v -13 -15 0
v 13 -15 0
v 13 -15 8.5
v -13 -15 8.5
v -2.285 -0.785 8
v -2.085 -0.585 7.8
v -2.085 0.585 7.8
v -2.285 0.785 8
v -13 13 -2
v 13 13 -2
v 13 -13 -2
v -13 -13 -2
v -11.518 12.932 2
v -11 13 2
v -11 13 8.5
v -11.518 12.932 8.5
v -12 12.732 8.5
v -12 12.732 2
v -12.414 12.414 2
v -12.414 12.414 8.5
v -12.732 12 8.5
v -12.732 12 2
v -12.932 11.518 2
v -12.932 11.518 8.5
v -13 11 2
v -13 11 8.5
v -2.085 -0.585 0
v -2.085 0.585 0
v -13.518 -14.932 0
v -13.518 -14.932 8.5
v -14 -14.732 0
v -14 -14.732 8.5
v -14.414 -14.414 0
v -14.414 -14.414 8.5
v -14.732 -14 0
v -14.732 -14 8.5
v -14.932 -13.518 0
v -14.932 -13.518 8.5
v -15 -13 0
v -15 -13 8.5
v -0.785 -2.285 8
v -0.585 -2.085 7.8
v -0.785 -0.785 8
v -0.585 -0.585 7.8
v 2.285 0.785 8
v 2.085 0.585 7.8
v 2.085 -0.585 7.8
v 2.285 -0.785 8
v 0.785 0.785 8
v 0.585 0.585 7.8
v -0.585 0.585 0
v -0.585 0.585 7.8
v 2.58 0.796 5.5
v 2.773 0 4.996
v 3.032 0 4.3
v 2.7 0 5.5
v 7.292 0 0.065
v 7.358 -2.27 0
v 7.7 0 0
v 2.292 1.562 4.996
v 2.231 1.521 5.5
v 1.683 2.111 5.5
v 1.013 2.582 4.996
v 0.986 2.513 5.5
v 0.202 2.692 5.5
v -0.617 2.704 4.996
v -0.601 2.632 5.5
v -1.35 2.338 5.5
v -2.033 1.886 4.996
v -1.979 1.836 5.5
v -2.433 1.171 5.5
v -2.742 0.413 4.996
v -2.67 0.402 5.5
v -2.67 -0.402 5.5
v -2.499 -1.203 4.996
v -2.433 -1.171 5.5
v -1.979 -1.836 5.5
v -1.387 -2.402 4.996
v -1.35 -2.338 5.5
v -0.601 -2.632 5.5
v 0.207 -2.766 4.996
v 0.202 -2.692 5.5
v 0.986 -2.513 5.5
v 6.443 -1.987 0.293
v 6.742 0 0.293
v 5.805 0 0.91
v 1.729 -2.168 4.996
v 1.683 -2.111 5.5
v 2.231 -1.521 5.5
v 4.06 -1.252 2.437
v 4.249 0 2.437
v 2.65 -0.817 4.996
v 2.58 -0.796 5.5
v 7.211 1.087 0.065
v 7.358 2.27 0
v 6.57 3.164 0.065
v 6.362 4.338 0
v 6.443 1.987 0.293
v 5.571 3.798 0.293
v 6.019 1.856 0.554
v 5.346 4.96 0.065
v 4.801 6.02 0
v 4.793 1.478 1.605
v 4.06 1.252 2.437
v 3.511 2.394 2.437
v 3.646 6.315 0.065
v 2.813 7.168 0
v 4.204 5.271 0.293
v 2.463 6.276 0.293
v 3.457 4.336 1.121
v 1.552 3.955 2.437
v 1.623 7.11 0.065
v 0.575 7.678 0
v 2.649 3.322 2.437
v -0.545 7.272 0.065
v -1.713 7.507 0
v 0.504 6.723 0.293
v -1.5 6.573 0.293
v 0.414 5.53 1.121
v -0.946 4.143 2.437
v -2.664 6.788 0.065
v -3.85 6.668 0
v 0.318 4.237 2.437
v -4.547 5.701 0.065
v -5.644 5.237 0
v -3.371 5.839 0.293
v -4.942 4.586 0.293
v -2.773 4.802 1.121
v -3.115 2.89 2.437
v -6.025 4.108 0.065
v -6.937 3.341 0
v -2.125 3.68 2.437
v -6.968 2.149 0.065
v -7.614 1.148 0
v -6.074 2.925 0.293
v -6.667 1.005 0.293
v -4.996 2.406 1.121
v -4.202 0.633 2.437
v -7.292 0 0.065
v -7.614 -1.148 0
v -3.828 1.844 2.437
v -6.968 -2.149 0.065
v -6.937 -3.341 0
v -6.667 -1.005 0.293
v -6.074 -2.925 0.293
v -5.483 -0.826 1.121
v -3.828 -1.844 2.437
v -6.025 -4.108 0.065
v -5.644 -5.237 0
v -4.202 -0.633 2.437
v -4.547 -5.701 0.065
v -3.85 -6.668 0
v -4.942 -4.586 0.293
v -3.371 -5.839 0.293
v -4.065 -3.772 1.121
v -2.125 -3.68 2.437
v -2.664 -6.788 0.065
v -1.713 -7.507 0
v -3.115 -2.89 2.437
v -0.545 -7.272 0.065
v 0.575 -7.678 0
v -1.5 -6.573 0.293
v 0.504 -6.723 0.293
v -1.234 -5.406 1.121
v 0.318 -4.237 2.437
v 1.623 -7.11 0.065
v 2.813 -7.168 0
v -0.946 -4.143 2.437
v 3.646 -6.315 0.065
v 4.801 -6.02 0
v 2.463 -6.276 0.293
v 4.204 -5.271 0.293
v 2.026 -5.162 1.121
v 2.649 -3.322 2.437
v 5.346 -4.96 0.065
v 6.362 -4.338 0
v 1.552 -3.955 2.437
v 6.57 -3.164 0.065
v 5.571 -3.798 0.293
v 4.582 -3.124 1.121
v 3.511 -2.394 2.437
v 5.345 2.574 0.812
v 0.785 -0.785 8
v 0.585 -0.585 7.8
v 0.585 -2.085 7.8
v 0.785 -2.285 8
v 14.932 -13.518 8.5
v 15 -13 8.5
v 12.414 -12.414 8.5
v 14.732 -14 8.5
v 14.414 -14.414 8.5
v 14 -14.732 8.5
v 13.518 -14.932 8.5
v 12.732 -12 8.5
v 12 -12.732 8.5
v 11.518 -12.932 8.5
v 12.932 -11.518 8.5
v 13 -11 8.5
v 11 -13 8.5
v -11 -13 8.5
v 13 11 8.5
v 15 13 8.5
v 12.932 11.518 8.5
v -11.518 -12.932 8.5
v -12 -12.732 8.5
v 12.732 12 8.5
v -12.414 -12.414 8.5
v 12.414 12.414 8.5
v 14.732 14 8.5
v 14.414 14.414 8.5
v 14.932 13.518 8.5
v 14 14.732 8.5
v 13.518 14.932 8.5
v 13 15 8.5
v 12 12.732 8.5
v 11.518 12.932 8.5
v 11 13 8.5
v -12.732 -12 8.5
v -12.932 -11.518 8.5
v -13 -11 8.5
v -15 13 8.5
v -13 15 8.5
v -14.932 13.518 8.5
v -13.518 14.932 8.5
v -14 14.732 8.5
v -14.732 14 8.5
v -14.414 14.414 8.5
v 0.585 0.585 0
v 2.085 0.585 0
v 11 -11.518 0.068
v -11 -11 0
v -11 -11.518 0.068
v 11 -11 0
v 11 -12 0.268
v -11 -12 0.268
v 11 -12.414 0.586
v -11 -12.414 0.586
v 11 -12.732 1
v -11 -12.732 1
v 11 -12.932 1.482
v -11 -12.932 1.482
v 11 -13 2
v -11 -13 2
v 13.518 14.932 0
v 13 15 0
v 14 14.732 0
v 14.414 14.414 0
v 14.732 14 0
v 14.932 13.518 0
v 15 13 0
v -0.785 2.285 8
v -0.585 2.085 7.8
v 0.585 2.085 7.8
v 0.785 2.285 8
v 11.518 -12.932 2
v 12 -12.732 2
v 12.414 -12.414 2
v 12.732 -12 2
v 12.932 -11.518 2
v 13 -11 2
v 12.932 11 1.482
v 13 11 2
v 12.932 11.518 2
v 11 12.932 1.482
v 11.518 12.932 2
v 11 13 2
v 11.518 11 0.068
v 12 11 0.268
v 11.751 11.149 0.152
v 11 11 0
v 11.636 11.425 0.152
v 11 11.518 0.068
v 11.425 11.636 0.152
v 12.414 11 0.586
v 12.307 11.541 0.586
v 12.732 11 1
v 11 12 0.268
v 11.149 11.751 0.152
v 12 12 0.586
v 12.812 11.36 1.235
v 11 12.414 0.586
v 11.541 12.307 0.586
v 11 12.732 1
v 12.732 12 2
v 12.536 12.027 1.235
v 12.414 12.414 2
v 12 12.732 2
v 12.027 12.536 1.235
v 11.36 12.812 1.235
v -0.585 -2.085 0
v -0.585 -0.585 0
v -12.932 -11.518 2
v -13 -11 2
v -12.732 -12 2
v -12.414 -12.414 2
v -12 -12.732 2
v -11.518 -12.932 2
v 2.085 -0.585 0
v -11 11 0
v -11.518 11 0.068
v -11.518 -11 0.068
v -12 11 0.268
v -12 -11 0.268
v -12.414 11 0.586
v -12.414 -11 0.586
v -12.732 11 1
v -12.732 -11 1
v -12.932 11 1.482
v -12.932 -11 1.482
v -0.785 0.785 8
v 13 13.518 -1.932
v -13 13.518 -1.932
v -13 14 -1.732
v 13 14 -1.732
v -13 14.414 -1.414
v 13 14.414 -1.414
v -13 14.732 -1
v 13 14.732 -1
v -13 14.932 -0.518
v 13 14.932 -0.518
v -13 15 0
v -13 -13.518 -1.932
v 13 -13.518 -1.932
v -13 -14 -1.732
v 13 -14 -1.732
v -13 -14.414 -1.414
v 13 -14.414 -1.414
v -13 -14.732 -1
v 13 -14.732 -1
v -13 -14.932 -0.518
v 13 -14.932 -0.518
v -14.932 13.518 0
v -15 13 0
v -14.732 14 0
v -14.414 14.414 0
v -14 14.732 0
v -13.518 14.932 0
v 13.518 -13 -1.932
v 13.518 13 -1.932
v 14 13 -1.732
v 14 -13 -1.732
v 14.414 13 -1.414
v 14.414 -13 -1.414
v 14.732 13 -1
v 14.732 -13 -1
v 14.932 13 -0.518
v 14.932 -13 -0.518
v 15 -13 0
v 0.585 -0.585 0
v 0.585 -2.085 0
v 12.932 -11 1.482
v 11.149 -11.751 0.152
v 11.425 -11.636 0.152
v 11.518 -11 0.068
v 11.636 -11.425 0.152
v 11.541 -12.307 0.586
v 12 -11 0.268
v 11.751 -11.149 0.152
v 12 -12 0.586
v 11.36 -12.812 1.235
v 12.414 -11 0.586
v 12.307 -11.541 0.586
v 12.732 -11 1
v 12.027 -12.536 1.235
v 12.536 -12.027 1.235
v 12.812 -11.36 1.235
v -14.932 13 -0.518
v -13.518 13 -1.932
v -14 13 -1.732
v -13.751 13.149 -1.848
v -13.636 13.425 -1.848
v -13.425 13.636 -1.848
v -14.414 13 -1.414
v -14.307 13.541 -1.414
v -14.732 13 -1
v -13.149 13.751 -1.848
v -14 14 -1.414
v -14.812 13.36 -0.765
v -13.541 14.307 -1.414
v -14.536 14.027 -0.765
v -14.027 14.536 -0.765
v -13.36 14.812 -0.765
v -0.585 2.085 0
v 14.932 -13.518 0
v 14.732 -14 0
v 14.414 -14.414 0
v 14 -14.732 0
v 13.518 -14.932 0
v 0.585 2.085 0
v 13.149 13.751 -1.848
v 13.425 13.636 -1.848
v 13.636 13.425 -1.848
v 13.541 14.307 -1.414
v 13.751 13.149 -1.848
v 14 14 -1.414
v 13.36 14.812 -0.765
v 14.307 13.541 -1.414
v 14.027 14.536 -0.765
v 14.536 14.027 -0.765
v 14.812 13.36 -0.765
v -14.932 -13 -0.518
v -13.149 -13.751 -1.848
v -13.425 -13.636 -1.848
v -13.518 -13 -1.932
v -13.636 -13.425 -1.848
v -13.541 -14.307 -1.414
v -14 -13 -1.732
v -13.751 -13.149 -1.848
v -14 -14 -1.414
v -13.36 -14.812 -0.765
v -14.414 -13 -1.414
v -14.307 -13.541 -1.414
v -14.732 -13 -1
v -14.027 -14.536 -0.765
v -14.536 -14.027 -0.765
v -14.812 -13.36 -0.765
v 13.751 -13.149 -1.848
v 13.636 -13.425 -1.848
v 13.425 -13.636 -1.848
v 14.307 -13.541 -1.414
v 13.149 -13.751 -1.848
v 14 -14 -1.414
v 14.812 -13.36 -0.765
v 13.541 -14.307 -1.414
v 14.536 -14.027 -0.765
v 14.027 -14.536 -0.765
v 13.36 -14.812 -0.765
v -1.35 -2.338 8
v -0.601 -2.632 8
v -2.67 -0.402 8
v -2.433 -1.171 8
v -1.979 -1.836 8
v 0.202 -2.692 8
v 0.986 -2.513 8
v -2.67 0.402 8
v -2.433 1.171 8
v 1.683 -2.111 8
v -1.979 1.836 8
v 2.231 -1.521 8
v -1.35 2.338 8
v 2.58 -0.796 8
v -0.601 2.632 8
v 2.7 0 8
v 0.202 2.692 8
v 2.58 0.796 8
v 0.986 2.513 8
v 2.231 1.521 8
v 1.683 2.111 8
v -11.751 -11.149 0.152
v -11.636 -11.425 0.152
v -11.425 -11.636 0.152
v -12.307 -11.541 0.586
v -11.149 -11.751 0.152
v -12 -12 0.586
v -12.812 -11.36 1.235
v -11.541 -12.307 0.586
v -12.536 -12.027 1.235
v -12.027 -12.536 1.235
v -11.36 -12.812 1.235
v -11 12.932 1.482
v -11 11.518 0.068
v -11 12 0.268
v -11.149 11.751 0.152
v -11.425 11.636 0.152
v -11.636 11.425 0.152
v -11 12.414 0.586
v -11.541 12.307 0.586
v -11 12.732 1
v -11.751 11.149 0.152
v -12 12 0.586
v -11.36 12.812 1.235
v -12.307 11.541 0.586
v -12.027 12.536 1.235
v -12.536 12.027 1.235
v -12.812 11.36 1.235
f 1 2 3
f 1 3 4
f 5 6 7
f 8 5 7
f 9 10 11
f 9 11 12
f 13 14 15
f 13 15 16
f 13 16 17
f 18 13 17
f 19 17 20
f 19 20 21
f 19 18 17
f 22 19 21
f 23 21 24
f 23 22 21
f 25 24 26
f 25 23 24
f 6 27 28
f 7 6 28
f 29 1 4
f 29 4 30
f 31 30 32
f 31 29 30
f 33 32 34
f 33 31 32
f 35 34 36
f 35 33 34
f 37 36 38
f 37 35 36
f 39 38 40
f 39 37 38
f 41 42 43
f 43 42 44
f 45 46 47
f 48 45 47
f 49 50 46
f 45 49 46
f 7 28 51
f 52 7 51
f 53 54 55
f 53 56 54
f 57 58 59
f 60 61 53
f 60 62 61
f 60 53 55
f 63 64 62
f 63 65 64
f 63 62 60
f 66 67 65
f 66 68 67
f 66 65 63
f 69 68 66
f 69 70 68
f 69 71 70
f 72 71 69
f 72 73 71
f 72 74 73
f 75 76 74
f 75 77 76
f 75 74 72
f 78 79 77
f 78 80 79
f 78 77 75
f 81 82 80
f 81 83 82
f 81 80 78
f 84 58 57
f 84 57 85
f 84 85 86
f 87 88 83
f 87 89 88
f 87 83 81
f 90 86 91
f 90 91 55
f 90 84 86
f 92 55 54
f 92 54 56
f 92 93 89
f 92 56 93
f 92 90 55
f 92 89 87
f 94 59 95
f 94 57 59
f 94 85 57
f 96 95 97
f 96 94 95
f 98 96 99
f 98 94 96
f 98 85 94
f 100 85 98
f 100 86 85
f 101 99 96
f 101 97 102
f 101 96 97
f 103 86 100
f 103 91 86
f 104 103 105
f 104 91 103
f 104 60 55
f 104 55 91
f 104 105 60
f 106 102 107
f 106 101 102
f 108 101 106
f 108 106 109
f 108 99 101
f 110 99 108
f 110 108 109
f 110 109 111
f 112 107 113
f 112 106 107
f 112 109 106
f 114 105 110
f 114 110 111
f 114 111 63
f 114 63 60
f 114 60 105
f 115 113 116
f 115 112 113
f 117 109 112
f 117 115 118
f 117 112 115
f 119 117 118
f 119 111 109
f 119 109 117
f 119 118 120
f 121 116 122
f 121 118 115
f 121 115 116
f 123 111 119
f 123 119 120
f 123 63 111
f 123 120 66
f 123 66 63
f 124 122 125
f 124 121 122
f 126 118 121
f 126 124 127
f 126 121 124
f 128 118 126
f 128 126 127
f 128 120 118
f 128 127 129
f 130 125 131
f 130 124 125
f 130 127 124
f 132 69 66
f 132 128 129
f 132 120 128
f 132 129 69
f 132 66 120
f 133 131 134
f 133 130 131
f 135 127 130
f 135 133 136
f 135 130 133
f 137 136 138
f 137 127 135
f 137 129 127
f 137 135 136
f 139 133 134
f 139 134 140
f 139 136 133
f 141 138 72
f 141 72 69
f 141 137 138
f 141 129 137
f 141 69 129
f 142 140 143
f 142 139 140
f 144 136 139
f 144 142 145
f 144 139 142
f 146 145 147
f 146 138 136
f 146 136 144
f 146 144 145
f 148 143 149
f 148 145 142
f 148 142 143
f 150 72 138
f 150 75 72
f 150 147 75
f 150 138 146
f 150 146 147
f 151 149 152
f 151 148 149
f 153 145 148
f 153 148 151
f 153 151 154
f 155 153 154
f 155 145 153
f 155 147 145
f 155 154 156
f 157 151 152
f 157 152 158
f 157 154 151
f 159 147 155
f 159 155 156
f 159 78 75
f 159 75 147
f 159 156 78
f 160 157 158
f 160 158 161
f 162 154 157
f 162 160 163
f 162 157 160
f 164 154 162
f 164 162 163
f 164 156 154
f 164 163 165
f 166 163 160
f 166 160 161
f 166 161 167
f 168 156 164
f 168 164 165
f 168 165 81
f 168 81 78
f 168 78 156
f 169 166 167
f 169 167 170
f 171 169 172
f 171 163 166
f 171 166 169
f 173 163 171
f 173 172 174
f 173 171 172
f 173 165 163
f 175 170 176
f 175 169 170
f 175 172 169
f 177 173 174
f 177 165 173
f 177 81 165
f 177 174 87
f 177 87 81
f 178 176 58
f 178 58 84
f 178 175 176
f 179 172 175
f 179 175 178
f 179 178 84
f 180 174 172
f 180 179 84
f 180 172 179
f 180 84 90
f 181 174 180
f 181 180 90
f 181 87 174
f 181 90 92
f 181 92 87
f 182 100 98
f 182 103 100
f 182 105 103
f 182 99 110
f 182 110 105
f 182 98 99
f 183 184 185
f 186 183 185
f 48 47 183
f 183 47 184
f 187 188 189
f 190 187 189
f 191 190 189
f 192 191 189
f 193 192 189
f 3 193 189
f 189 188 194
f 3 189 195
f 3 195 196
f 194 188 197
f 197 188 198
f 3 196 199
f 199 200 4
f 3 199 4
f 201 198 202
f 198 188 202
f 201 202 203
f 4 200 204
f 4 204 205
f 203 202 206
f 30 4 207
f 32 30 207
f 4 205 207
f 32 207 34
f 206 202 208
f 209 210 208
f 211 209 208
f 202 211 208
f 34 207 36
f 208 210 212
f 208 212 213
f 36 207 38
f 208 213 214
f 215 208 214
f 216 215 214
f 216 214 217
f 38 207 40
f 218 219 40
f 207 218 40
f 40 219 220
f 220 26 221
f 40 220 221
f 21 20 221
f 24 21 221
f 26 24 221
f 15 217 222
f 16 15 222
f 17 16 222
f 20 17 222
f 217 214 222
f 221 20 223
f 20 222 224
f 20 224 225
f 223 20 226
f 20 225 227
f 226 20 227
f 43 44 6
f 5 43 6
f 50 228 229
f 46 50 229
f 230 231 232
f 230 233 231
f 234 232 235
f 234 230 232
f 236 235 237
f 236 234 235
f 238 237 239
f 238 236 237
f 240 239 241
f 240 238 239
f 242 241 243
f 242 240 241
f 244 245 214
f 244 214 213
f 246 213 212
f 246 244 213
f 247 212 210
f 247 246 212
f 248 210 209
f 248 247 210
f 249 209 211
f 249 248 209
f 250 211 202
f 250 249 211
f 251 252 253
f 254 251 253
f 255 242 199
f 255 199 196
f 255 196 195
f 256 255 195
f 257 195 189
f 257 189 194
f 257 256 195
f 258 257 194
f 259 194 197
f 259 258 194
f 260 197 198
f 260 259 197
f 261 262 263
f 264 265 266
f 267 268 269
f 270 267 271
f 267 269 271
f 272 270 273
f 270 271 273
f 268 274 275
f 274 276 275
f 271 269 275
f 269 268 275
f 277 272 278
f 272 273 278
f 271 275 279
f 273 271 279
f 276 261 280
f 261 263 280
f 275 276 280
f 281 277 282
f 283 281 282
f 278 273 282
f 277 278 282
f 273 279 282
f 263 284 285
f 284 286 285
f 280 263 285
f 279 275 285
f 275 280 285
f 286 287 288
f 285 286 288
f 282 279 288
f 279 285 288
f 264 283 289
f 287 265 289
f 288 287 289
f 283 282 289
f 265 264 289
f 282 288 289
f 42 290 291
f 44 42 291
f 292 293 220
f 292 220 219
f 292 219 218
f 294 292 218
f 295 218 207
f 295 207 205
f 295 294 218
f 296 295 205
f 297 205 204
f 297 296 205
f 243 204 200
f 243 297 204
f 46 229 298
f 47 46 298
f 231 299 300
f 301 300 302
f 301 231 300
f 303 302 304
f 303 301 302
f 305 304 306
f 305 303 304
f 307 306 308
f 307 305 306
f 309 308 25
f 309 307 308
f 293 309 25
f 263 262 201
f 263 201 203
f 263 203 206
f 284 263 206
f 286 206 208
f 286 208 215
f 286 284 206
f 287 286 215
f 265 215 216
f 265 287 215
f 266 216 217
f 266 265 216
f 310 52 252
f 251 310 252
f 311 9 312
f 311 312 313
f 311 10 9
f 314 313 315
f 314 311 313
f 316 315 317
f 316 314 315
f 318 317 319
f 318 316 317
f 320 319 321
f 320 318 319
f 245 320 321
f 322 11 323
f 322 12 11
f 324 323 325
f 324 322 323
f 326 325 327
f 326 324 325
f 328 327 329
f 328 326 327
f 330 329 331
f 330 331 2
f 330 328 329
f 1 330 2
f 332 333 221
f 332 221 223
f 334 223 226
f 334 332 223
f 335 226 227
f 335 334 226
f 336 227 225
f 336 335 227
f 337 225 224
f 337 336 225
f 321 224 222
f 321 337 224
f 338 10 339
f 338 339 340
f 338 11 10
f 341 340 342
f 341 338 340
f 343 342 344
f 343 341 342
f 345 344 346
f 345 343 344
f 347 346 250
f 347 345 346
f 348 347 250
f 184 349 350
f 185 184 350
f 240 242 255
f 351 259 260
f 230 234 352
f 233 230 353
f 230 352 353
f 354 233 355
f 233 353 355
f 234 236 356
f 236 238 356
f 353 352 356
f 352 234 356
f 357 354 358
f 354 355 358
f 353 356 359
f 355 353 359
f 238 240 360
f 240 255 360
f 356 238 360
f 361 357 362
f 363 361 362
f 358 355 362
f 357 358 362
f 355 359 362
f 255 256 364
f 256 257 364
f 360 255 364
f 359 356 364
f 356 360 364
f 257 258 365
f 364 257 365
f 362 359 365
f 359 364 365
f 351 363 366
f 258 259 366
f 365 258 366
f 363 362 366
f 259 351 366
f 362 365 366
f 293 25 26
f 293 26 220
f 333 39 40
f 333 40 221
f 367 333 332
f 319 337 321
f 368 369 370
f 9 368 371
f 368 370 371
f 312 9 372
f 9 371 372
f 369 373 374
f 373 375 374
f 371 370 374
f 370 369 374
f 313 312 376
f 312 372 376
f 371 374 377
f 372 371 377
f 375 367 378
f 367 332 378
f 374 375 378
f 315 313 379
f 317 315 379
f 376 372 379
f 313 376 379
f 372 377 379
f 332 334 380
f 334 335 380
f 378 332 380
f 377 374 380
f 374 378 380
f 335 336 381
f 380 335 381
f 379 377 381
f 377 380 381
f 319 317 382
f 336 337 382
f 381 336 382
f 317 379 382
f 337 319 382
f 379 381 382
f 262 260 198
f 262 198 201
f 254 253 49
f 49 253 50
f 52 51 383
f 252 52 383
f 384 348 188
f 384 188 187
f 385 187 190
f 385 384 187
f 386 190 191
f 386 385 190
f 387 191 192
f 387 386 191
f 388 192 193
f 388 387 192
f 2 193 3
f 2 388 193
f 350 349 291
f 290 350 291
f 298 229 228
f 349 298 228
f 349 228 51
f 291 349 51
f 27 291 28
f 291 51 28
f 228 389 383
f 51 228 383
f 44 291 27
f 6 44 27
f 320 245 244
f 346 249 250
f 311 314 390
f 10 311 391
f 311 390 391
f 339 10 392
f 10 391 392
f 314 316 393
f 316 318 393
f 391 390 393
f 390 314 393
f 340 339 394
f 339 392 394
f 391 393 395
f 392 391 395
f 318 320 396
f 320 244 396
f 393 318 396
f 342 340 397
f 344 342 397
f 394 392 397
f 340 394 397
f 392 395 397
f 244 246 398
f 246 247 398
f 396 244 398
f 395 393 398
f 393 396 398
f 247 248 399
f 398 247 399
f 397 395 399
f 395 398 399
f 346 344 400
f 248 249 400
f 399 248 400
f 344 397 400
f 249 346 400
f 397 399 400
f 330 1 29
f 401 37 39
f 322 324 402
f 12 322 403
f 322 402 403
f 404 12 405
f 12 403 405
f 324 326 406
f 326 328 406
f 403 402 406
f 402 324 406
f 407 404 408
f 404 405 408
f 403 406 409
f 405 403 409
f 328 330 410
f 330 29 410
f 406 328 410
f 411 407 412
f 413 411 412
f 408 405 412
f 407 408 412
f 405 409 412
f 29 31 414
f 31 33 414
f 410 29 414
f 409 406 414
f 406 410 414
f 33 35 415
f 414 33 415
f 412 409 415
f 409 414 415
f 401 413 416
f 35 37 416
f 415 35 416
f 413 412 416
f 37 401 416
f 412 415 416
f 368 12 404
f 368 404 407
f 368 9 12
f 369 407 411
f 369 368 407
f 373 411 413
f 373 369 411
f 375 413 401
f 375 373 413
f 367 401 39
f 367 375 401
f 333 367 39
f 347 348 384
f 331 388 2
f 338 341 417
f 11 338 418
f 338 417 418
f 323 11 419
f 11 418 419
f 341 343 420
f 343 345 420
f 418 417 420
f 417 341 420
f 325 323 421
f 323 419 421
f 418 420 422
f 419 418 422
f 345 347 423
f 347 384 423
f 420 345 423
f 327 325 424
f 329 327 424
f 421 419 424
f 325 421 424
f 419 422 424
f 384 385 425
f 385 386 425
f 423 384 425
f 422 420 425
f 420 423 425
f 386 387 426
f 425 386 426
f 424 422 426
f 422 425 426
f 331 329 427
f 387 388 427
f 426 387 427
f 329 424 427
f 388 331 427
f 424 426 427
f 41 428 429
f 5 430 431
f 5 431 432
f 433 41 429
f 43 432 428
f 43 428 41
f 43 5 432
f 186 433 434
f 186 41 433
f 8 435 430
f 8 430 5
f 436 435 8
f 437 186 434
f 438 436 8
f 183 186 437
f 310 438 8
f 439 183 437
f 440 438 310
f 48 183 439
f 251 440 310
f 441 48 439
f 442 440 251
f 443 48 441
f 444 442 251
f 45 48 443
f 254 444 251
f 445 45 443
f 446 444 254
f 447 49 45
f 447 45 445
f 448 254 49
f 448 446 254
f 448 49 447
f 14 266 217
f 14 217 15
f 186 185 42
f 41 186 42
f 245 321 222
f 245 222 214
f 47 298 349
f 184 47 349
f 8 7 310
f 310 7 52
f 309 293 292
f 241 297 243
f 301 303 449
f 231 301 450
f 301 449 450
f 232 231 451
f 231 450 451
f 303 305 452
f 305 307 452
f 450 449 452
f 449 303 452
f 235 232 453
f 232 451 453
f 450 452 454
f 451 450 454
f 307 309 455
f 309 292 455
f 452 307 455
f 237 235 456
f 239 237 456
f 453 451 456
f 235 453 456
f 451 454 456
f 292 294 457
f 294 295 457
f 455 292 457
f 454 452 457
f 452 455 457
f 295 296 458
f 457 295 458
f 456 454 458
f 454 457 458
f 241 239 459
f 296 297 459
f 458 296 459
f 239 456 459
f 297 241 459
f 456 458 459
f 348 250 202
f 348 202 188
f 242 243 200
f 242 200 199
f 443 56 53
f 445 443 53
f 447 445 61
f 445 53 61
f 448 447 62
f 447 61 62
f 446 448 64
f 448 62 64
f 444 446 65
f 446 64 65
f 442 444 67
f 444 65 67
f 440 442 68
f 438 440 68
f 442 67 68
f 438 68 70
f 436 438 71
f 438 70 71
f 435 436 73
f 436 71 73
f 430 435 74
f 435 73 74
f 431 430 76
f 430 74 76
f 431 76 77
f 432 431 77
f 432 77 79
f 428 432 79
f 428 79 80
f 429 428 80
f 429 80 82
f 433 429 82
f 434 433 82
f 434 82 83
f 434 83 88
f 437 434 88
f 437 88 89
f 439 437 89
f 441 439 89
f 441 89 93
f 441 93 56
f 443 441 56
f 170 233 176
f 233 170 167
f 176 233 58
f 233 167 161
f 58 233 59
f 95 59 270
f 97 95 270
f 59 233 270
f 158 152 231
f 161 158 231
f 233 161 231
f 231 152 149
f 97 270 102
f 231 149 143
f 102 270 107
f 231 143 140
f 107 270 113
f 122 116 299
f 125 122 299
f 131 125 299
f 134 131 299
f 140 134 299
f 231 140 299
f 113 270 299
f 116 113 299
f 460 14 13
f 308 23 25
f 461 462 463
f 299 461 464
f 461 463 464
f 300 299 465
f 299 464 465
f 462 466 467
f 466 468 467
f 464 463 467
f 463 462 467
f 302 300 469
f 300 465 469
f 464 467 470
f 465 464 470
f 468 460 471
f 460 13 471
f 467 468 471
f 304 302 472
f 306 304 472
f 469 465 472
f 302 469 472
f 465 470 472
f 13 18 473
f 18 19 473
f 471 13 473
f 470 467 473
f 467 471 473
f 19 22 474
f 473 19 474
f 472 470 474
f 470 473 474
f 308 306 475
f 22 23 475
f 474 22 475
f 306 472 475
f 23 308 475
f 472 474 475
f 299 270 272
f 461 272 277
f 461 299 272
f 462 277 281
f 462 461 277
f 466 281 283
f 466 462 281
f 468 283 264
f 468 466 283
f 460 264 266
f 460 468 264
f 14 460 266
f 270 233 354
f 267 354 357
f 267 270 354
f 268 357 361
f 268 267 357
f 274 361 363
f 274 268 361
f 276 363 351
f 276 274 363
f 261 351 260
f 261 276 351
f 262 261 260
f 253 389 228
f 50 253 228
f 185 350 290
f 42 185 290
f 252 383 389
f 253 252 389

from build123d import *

# Parameters (mm, degrees)
EXTRUDE_1_DEPTH = 8.5
SKETCH_1_6_R    = 2.7
EXTRUDE_2_DEPTH = 8
EXTRUDE_START   = -2
EXTRUDE_3_DEPTH = 2
FILLET_1_R      = 2
CHAMFER_1_SIZE  = 0.2
FILLET_2_R      = 2
FILLET_3_SIZE   = 5
FILLET_3_SIZE_2 = 5.5


with BuildPart() as part:
    # 草图1 → 凸台-拉伸1 (new body)
    with BuildSketch(Plane.XY):
        with BuildLine():
            ThreePointArc((-15, 13), (-14.414213562, 14.414213562), (-13, 15))
            Line((-13, 15), (13, 15))
            ThreePointArc((13, 15), (14.414213562, 14.414213562), (15, 13))
            Line((15, 13), (15, -13))
            ThreePointArc((15, -13), (14.414213562, -14.414213562), (13, -15))
            Line((13, -15), (-13, -15))
            ThreePointArc((-13, -15), (-14.414213562, -14.414213562), (-15, -13))
            Line((-15, -13), (-15, 13))
        make_face()
        with BuildLine():
            ThreePointArc((-13, -11), (-12.414213562, -12.414213562), (-11, -13))
            Line((-11, -13), (11, -13))
            ThreePointArc((11, -13), (12.414213562, -12.414213562), (13, -11))
            Line((13, -11), (13, 11))
            ThreePointArc((13, 11), (12.414213562, 12.414213562), (11, 13))
            Line((11, 13), (-11, 13))
            ThreePointArc((-11, 13), (-12.414213562, 12.414213562), (-13, 11))
            Line((-13, 11), (-13, -11))
        make_face(mode=Mode.SUBTRACT)
    extrude(amount=EXTRUDE_1_DEPTH)



with BuildPart() as body_2:
    # 草图1<6> → 凸台-拉伸2 (new body)
    with BuildSketch(Plane.XY):
        Circle(SKETCH_1_6_R)
        Polygon((-2.085, -0.585), (-2.085, 0.585), (-0.585, 0.585), (-0.585, 2.085), (0.585, 2.085), (0.585, 0.585), (2.085, 0.585), (2.085, -0.585), (0.585, -0.585), (0.585, -2.085), (-0.585, -2.085), (-0.585, -0.585), align=None, mode=Mode.SUBTRACT)
    extrude(amount=EXTRUDE_2_DEPTH)


with BuildPart() as part_1:
    add(part.part)

    add(body_2.part)  # 凸台-拉伸3 merges body 2
    # 草图1<7> → 凸台-拉伸3 (add)
    with BuildSketch(Plane.XY.offset(EXTRUDE_START)):
        with BuildLine():
            Line((-13, 15), (13, 15))
            ThreePointArc((13, 15), (14.414213562, 14.414213562), (15, 13))
            Line((15, 13), (15, -13))
            ThreePointArc((15, -13), (14.414213562, -14.414213562), (13, -15))
            Line((13, -15), (-13, -15))
            ThreePointArc((-13, -15), (-14.414213562, -14.414213562), (-15, -13))
            Line((-15, -13), (-15, 13))
            ThreePointArc((-15, 13), (-14.414213562, 14.414213562), (-13, 15))
        make_face()
    extrude(amount=EXTRUDE_3_DEPTH)

    # 圆角1
    fillet_1_edges = [part_1.edges().sort_by_distance(p)[0] for p in [
        (-14.414213562, -14.414213562, -2),
        (-15, 0, -2),
        (14.414213562, 14.414213562, -2),
        (14.414213562, -14.414213562, -2),
        (0, -15, -2),
        (-14.414213562, 14.414213562, -2),
        (0, 15, -2),
        (15, 0, -2),
    ]]
    fillet(fillet_1_edges, radius=FILLET_1_R)

    # 倒角1
    chamfer_1_edges = [part_1.edges().sort_by_distance(p)[0] for p in [
        (1.335, -0.585, 8),
        (0, -2.085, 8),
        (-0.585, -1.335, 8),
        (-1.335, -0.585, 8),
        (-2.085, 0, 8),
        (-0.585, 1.335, 8),
        (0, 2.085, 8),
        (0.585, 1.335, 8),
        (1.335, 0.585, 8),
        (2.085, 0, 8),
        (0.585, -1.335, 8),
        (-1.335, 0.585, 8),
    ]]
    chamfer(chamfer_1_edges, length=CHAMFER_1_SIZE)

    # 圆角2
    fillet_2_edges = [part_1.edges().sort_by_distance(p)[0] for p in [
        (0, -13, 0),
        (12.414213562, -12.414213562, 0),
        (13, 0, 0),
        (12.414213562, 12.414213562, 0),
        (0, 13, 0),
        (-12.414213562, 12.414213562, 0),
        (-13, 0, 0),
        (-12.414213562, -12.414213562, 0),
    ]]
    fillet(fillet_2_edges, radius=FILLET_2_R)

    # 圆角3
    # a fillet whose section is not a circle: 5.5, 5 mm, written as the material it adds along each edge
    with BuildSketch(Plane(origin=(0, 0, 0), x_dir=(1, 0, 0), z_dir=(0, -1, 0))) as fillet_3_piece_1:
        with BuildLine():
            Bezier((2.7 + FILLET_3_SIZE, 0), (2.7, 0), (2.7, FILLET_3_SIZE_2), weights=[1, 0.333333333, 1])
            Line((2.7, FILLET_3_SIZE_2), (2.7, 0))
            Line((2.7, 0), (2.7 + FILLET_3_SIZE, 0))
        make_face()
    revolve(axis=Axis((0, 0, 0), (0, 0, 1)))


solid = part_1.part
